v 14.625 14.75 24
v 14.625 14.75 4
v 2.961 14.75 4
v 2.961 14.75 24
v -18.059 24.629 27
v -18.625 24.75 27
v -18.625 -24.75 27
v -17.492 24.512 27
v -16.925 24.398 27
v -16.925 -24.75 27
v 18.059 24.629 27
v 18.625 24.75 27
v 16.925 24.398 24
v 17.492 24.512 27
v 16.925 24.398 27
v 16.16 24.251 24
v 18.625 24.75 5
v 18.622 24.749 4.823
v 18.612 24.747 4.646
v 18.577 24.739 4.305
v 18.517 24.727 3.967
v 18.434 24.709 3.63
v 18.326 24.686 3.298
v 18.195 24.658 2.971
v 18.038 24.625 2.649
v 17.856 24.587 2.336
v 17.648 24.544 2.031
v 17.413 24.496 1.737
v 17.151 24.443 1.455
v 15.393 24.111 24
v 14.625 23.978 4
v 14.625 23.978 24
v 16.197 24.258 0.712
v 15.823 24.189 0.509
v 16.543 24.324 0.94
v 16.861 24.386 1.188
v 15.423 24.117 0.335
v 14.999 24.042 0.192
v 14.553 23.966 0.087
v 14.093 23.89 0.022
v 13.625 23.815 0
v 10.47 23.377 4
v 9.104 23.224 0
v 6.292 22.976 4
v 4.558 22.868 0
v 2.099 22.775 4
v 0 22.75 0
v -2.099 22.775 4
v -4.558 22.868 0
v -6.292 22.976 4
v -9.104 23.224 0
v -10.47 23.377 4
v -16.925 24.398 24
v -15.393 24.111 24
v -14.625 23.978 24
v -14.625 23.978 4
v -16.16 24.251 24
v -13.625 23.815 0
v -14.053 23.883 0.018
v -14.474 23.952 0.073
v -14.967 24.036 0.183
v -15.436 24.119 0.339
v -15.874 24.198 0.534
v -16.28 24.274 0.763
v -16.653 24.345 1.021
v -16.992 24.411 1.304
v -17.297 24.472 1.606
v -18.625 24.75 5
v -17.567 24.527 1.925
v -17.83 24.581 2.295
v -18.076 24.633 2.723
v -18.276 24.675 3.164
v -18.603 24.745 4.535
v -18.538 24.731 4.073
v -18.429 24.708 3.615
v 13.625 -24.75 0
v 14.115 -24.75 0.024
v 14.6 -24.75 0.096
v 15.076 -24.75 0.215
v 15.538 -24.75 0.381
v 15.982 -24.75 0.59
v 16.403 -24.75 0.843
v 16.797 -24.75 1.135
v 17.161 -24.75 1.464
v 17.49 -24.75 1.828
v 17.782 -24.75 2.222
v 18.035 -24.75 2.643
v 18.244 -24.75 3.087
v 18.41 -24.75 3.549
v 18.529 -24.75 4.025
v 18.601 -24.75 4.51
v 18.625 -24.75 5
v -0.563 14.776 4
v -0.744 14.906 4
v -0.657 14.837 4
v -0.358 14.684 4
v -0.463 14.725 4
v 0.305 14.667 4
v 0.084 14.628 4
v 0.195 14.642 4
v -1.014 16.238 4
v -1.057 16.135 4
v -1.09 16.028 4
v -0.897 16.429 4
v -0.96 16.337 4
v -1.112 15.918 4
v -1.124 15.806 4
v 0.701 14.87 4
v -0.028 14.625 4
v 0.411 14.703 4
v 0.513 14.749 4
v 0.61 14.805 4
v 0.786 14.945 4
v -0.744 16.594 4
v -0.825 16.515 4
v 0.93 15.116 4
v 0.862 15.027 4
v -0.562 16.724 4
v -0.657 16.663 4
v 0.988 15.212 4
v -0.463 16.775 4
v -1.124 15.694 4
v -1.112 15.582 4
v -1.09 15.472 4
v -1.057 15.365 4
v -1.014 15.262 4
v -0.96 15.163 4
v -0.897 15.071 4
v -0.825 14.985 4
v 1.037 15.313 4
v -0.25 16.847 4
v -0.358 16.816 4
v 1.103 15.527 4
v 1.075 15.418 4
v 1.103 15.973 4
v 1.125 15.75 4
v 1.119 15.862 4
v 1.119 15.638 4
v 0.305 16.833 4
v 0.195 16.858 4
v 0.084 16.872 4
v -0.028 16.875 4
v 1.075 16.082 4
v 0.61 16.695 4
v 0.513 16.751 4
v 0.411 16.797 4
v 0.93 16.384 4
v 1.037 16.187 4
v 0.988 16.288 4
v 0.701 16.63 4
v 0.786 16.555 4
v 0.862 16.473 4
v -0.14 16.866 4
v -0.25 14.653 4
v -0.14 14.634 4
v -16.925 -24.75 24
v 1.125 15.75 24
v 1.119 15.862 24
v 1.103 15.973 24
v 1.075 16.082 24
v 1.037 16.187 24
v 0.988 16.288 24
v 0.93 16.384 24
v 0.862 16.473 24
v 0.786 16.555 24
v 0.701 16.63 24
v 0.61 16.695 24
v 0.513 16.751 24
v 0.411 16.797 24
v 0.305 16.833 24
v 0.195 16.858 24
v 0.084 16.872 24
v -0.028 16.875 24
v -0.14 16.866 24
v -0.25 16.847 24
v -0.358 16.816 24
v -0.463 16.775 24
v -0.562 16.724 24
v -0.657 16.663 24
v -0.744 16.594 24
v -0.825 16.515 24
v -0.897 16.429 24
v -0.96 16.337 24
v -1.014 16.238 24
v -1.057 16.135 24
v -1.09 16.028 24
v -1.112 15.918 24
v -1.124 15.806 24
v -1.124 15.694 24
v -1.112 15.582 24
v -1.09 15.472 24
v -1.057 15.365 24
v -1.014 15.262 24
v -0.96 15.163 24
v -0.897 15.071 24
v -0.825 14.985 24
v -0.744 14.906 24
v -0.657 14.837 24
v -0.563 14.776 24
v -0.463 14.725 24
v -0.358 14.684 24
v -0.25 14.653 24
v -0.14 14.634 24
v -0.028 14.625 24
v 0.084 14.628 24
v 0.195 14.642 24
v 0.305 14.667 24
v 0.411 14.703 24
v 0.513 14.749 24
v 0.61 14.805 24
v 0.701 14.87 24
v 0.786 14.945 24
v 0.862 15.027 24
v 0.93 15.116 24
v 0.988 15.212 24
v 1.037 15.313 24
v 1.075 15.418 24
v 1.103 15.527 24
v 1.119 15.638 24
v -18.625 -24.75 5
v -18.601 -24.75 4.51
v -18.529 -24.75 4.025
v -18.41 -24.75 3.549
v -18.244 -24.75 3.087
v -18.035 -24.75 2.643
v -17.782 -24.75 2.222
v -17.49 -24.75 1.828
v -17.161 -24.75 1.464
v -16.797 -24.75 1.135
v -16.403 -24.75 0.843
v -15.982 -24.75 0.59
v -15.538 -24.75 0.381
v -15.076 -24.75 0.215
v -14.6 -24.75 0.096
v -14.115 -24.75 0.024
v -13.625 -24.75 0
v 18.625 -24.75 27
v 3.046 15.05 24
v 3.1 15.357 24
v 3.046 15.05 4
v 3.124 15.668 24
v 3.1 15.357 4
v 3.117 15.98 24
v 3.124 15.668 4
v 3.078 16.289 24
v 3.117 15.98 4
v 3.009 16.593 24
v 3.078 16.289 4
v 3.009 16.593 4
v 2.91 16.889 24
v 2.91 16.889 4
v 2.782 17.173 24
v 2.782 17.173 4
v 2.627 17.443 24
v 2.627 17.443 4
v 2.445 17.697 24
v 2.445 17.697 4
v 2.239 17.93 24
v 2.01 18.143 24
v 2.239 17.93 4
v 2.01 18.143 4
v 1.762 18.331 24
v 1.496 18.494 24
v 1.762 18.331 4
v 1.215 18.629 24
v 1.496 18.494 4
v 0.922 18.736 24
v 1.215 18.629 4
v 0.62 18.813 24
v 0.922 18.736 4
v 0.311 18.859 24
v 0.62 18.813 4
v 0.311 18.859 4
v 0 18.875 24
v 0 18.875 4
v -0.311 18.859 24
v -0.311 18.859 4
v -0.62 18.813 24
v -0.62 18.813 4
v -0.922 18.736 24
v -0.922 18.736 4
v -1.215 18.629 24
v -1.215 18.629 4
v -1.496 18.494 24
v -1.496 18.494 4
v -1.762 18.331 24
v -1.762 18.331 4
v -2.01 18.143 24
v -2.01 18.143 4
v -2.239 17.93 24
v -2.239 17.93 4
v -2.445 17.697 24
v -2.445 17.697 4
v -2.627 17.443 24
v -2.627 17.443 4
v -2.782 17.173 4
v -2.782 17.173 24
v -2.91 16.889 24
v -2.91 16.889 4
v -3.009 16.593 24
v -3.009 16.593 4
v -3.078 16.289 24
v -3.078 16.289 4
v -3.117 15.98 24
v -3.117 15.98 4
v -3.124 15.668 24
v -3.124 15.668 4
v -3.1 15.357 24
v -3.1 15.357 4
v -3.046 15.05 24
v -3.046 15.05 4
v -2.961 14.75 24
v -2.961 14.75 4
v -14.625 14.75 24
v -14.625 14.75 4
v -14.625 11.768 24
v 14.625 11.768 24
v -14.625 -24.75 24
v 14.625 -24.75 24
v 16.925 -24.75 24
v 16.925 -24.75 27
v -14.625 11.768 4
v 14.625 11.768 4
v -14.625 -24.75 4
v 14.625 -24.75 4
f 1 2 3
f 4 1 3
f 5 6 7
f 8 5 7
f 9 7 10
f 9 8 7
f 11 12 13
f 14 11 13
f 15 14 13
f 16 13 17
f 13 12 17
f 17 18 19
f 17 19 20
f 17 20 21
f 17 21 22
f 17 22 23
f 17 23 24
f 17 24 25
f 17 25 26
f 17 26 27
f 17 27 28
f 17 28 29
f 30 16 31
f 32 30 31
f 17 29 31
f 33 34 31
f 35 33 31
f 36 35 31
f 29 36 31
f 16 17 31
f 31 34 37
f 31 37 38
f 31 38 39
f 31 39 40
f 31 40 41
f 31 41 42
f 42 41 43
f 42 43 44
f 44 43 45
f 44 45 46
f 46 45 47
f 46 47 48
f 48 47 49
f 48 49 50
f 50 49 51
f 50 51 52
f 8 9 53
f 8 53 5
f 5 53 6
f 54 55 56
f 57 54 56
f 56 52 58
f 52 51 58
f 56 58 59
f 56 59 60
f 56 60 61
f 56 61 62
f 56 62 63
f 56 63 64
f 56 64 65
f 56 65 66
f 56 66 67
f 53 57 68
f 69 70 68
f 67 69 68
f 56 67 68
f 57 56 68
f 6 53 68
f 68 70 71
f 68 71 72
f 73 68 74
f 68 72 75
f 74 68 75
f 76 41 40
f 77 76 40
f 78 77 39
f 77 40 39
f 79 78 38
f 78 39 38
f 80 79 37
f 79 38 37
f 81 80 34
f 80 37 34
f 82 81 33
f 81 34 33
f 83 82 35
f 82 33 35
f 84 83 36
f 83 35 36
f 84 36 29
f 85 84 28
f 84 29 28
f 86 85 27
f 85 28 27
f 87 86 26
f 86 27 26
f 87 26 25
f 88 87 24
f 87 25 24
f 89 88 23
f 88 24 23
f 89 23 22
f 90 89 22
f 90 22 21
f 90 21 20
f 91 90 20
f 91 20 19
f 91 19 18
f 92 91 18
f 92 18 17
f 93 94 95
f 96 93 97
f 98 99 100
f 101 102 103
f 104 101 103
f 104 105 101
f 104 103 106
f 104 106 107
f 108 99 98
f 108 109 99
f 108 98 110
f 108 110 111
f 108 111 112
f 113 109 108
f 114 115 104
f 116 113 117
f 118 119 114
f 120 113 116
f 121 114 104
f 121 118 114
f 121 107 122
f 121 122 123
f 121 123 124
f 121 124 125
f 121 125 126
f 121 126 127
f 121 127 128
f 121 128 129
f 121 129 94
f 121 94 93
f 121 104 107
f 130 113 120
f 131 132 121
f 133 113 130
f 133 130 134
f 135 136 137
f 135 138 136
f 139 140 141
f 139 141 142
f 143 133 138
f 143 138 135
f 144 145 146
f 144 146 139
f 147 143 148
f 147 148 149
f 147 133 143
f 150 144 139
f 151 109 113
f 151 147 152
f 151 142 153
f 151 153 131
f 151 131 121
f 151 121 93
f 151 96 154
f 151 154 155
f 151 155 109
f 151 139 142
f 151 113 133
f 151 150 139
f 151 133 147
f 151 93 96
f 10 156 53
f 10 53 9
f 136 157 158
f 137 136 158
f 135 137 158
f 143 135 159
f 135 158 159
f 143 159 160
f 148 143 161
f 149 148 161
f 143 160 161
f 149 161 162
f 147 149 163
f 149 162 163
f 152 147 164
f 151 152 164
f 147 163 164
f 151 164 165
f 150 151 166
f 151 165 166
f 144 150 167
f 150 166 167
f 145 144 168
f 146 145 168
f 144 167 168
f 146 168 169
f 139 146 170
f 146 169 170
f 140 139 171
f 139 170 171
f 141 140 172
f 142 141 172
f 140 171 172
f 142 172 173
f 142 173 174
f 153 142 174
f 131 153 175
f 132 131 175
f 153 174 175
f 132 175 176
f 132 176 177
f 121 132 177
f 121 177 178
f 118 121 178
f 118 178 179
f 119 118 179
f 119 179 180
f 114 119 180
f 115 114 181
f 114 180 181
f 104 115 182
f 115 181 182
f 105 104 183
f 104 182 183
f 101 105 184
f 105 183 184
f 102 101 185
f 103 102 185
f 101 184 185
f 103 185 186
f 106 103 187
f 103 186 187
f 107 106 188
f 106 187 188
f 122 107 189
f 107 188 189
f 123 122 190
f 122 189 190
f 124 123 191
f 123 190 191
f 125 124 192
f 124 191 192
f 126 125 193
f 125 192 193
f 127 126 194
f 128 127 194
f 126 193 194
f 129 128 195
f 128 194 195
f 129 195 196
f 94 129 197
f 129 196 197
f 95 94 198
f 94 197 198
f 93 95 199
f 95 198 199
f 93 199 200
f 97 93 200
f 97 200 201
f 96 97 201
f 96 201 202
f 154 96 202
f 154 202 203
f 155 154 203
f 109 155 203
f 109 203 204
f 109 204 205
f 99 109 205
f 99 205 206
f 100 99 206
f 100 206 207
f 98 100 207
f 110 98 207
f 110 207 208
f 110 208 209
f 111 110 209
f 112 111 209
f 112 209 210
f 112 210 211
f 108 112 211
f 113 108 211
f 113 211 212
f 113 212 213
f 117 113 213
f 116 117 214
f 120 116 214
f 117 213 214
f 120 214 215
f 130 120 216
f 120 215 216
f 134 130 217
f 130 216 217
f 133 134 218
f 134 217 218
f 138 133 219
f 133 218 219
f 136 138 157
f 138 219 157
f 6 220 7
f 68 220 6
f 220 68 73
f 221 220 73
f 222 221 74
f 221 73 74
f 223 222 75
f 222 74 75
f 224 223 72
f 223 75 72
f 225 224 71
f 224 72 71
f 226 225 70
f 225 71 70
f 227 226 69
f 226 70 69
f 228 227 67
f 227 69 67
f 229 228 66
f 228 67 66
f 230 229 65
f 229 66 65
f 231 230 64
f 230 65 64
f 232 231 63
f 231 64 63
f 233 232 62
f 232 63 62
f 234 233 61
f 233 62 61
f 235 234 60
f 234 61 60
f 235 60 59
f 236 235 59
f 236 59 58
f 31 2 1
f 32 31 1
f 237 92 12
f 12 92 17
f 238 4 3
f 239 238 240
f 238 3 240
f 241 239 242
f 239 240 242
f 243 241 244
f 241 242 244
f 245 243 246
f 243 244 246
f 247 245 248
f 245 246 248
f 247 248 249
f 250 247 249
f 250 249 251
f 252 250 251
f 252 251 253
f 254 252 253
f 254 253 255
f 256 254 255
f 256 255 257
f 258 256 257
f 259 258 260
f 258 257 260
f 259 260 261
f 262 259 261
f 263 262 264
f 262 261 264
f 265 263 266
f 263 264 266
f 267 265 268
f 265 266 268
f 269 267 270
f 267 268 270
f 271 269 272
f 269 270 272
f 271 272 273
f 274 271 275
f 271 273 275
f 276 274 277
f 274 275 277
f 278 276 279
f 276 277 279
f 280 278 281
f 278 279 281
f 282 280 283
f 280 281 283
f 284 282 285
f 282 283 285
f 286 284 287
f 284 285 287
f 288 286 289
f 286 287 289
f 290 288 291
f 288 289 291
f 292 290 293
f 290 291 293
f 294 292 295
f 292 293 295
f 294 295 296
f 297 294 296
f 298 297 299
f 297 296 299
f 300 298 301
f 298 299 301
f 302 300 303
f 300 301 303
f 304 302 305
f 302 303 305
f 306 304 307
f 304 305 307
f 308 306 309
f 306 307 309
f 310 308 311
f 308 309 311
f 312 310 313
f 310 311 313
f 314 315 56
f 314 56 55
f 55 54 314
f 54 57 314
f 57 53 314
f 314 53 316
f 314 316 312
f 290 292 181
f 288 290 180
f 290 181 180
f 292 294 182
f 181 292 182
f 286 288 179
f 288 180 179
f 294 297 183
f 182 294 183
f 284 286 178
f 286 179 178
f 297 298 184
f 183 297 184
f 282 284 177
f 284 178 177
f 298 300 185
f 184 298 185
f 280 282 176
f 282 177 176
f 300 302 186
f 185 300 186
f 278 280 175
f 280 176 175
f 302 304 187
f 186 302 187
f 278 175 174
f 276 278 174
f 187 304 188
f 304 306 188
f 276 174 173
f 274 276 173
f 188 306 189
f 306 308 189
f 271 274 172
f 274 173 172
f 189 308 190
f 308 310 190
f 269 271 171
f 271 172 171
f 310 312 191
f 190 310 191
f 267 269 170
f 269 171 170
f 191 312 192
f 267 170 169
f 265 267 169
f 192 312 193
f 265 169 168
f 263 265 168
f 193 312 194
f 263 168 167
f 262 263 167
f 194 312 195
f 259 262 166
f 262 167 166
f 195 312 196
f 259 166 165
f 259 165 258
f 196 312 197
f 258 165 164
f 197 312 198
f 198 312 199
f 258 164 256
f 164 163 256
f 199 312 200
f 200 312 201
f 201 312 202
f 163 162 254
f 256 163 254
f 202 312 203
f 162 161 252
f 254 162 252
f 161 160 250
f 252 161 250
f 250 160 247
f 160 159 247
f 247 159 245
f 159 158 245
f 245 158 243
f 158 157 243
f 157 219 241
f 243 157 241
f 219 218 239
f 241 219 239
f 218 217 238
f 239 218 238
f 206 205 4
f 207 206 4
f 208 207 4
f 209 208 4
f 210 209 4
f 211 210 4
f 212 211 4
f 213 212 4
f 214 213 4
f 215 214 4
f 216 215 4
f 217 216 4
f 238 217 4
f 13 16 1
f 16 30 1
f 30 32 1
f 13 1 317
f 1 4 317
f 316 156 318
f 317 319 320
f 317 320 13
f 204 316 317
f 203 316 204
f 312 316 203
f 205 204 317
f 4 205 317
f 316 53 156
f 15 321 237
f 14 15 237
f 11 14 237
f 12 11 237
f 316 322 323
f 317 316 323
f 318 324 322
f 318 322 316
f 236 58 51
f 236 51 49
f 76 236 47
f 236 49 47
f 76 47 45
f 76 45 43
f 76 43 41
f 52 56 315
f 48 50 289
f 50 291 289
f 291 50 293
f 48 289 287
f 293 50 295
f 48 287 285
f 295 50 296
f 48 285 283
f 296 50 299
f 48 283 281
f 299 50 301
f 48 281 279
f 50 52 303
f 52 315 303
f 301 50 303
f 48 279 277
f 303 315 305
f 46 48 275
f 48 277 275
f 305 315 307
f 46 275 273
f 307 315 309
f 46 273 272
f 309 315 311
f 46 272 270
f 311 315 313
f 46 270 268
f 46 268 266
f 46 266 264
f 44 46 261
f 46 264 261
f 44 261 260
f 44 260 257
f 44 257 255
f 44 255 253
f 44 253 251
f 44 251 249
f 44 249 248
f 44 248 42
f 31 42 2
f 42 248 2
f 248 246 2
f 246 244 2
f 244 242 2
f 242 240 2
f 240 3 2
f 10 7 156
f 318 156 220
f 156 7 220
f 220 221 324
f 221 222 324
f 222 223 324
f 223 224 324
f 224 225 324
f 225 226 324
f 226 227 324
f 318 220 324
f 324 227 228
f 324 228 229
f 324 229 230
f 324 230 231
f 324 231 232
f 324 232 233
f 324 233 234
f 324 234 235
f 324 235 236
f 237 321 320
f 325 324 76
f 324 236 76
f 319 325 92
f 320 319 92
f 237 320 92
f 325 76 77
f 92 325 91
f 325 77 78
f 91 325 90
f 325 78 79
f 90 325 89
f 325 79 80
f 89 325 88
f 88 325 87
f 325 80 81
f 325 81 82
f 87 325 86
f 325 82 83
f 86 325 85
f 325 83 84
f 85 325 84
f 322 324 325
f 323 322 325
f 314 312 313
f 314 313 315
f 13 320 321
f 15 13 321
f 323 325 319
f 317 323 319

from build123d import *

# Parameters (mm, degrees)
F0_W      = 37.25
F0_H      = 49.5
F1_DEPTH  = 27
F2_W      = 29.25
F2_H      = 23
F3_DEPTH  = 49.501
F4_W      = 2.3
F4_H      = 3
F5_DEPTH  = 49.501
F6_R      = 5
F7_R      = 3.125
F8_DEPTH  = 20
F10_DEPTH = 27.001
F12_DEPTH = 23
F13_W     = 33.85
F13_H     = 3
F14_DEPTH = 12.982547
F15_R     = 1.125
F16_DEPTH = 20


with BuildPart() as f1:
    # F0 (on Top) → F1 (new body)
    with BuildSketch(Plane.XY):
        Rectangle(F0_W, F0_H)
    extrude(amount=F1_DEPTH)

    # F2 (on face) → F3 (cut, through all)
    with BuildSketch(Plane.XZ.offset(24.75)):
        with Locations((0, 15.5)):
            Rectangle(F2_W, F2_H)
    extrude(amount=-F3_DEPTH, mode=Mode.SUBTRACT)

    # F4 (on face) → F5 (cut, through all)
    with BuildSketch(Plane.XZ.offset(24.75)):
        with Locations((-15.775, 25.5)):
            Rectangle(F4_W, F4_H)
        with Locations((15.775, 25.5)):
            Rectangle(F4_W, F4_H)
    extrude(amount=-F5_DEPTH, mode=Mode.SUBTRACT)

    # F6
    f6_edges = [f1.edges().sort_by_distance(p)[0] for p in [
        (18.625, 0, 0),
        (-18.625, 0, 0),
    ]]
    fillet(f6_edges, radius=F6_R)

    # F7 (on face) → F8 (join, through all)
    with BuildSketch(Plane.XY.offset(4)):
        with Locations((0, 15.75)):
            Circle(F7_R)
    extrude(amount=F8_DEPTH)

    # F9 (on face) → F10 (cut, through all)
    with BuildSketch(Plane(origin=(0, 0, 0), x_dir=(1, 0, 0), z_dir=(0, 0, -1))):
        with BuildLine():
            Line((-18.625, -24.75), (18.625, -24.75))
            ThreePointArc((18.625, -24.75), (0, -22.75), (-18.625, -24.75))
        make_face()
    extrude(amount=-F10_DEPTH, mode=Mode.SUBTRACT)

    # F11 (on face) → F12 (join, through all)
    with BuildSketch(Plane.XY.offset(4)):
        Polygon((17.763313, 14.75), (0, 14.75), (-17.661568, 14.75), (-17.661568, 11.768454), (17.763313, 11.768454), align=None)
    extrude(amount=F12_DEPTH)

    # F13 (on face) → F14 (cut, through all)
    with BuildSketch(Plane.XZ.offset(-11.768454)):
        with Locations((0, 25.5)):
            Rectangle(F13_W, F13_H)
    extrude(amount=-F14_DEPTH, mode=Mode.SUBTRACT)

    # F15 (on face) → F16 (cut, through all)
    with BuildSketch(Plane.XY.offset(24)):
        with Locations((0, 15.75)):
            Circle(F15_R)
    extrude(amount=-F16_DEPTH, mode=Mode.SUBTRACT)


solid = f1.part
